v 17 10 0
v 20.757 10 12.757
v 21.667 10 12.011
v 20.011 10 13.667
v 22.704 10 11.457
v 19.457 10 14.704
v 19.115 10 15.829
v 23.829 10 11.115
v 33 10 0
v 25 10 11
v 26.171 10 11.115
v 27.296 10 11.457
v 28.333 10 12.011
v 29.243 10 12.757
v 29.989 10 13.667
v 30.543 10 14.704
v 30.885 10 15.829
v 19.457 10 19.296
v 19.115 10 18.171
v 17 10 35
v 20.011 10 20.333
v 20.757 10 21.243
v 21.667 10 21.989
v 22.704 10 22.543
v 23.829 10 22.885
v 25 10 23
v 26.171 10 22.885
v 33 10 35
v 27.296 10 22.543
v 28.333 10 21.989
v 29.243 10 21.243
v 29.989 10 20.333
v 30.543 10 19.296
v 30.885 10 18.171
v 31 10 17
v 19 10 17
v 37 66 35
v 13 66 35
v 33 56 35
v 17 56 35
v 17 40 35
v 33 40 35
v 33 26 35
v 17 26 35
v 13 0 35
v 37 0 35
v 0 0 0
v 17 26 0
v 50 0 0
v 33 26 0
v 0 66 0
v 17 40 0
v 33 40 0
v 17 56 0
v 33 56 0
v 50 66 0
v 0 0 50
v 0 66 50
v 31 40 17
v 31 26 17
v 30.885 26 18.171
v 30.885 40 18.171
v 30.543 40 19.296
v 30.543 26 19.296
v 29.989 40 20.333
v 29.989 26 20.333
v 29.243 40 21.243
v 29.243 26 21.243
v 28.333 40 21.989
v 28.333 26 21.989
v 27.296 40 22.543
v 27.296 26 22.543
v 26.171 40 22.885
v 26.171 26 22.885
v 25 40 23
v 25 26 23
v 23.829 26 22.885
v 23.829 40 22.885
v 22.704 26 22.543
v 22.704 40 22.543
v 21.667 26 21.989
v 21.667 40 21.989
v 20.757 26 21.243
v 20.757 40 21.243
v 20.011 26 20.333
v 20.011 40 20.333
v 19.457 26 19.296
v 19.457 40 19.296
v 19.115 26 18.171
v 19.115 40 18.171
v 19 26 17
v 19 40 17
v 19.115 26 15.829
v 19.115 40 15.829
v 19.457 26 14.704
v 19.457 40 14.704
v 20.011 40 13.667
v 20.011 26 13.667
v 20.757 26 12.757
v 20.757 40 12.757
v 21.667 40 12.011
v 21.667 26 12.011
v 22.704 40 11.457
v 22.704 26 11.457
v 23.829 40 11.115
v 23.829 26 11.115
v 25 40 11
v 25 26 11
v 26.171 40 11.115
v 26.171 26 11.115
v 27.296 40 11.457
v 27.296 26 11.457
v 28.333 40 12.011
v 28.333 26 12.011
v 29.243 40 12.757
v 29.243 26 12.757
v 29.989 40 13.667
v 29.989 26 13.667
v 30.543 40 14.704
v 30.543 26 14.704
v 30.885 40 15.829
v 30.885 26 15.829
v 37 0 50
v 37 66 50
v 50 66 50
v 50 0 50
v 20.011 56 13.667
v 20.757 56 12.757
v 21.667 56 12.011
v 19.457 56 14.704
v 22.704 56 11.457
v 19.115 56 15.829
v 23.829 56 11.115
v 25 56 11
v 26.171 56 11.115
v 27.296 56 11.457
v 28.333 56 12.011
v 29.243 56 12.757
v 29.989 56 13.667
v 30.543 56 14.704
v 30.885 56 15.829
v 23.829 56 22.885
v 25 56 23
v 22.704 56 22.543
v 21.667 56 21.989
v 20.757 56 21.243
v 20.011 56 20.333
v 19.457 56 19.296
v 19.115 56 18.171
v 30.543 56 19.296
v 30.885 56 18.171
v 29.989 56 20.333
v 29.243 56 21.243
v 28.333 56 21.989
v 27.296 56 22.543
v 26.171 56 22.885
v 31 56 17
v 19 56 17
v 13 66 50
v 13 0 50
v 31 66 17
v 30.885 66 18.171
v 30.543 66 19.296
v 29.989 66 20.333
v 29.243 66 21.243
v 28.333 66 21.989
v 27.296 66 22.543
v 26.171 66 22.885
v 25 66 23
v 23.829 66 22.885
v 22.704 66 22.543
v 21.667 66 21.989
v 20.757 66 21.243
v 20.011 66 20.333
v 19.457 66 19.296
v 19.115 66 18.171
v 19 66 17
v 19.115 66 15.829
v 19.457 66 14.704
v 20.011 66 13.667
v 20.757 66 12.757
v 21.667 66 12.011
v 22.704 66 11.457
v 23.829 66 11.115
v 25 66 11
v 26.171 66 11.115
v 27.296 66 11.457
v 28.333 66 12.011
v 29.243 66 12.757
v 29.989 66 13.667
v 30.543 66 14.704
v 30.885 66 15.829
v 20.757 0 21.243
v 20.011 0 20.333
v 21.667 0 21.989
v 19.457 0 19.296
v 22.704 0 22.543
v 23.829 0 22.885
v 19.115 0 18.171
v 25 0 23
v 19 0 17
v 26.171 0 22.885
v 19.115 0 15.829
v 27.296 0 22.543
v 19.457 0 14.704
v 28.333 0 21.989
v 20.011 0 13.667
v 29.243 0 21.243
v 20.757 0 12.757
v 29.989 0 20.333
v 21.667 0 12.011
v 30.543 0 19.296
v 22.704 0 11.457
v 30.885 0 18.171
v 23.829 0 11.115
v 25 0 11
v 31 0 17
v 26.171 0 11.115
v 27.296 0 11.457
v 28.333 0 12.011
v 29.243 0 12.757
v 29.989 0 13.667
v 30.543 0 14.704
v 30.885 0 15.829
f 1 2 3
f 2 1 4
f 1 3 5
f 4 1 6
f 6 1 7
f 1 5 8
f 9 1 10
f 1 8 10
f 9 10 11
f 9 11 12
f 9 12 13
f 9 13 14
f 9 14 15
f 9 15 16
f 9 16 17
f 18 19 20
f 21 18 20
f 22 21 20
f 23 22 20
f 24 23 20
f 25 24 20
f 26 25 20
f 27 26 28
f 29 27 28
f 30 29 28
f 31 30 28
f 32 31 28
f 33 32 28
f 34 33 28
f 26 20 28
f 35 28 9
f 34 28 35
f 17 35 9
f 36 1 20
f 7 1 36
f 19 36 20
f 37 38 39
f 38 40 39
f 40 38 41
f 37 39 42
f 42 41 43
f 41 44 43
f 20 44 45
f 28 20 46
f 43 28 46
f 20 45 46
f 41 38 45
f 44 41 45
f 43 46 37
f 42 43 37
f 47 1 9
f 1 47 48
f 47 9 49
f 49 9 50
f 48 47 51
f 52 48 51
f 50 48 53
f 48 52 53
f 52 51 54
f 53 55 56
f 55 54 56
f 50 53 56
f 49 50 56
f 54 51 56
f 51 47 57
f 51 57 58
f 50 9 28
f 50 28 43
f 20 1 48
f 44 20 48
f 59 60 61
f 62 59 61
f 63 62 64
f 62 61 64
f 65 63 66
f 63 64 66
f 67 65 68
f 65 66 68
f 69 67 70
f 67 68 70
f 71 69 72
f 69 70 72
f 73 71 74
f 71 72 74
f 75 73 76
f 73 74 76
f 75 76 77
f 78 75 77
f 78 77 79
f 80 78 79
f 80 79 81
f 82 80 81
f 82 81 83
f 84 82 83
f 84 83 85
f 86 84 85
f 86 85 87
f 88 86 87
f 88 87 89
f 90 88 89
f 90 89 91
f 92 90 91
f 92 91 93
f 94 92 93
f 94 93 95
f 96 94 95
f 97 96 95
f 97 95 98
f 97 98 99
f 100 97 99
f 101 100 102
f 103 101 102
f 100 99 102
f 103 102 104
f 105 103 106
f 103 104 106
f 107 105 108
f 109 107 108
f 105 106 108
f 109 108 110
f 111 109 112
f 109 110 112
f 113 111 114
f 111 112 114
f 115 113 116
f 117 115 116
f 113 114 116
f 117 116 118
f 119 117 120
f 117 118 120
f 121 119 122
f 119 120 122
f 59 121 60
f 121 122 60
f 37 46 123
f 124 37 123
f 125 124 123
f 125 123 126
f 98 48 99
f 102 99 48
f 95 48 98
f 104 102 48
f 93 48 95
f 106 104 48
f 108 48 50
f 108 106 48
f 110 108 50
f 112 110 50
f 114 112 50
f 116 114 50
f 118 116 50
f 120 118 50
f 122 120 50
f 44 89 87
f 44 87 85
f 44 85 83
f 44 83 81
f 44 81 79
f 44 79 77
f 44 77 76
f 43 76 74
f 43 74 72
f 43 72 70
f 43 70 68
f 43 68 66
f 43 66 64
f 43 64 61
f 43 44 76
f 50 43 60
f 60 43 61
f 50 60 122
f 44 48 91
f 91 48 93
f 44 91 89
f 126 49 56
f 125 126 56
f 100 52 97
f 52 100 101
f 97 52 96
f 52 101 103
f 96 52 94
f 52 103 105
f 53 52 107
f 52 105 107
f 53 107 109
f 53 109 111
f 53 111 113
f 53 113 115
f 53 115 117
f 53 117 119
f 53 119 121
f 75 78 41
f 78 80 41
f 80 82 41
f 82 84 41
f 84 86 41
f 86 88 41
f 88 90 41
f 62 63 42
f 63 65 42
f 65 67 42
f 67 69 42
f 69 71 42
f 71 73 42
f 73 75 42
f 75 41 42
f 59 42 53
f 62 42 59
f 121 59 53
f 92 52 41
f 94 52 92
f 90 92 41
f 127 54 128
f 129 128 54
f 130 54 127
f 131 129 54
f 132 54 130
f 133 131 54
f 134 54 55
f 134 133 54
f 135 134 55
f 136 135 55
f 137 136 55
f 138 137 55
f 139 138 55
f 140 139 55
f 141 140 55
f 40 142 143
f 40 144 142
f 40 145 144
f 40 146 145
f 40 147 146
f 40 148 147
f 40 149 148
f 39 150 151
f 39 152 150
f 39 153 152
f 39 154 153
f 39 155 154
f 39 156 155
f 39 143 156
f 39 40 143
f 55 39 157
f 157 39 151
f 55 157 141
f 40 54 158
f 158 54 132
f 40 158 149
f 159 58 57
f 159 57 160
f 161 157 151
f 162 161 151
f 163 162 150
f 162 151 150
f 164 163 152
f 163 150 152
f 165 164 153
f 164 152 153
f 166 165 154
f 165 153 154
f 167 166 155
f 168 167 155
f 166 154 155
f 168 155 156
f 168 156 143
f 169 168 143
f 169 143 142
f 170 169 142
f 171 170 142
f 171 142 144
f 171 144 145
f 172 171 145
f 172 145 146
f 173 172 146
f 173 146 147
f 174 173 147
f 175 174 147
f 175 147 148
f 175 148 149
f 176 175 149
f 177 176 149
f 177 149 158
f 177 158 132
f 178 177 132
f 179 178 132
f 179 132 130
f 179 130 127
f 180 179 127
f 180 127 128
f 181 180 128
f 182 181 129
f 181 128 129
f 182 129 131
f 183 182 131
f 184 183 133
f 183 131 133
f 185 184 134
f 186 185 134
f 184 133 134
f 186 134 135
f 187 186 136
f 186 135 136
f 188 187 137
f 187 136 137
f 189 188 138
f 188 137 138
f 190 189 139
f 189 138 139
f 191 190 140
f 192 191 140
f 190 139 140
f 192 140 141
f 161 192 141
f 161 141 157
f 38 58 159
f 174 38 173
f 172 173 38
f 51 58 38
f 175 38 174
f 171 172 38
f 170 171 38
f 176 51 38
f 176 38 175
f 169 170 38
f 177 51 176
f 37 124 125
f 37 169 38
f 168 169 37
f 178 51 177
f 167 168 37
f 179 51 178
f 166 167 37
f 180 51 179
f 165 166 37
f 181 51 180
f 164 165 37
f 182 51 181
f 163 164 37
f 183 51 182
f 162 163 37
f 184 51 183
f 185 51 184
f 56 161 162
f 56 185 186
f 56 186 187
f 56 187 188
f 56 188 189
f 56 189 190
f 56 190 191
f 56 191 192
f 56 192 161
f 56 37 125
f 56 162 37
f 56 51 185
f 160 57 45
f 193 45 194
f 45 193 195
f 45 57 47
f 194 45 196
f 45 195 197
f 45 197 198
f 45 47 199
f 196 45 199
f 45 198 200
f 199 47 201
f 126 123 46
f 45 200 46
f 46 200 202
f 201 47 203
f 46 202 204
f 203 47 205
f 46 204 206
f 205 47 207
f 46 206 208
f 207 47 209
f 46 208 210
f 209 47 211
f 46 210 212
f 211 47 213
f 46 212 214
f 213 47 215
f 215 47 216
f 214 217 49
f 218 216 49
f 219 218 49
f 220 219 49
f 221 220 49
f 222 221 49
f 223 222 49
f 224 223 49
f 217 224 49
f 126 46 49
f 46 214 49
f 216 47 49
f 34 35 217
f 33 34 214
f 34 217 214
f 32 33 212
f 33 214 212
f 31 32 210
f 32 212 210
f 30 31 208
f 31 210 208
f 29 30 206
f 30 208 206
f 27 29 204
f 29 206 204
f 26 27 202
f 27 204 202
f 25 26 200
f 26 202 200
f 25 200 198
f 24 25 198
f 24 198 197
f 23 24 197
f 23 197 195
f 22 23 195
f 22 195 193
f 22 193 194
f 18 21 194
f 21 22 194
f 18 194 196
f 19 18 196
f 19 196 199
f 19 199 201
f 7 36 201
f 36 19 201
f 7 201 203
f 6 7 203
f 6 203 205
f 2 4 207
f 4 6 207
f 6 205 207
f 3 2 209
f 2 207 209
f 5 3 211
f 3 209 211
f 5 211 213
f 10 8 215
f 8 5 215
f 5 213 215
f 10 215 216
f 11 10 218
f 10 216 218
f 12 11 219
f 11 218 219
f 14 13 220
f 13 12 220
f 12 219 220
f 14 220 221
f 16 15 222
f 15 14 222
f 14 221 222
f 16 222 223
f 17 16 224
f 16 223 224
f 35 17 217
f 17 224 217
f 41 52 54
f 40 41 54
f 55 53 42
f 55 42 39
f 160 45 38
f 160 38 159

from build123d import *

# Parameters (mm, degrees)
F0_W     = 50
F0_H     = 66
F1_DEPTH = 50
F2_W     = 24
F2_H     = 15
F3_DEPTH = 66
F4_R     = 6
F5_DEPTH = 66
F6_W     = 12
F6_H     = 16
F7_DEPTH = 35
F8_W     = 2
F8_H     = 16
F9_DEPTH = 35


with BuildPart() as f1:
    # F0 (on Top) → F1 (new body)
    with BuildSketch(Plane.XY):
        with Locations((25, 33)):
            Rectangle(F0_W, F0_H)
    extrude(amount=F1_DEPTH)

    # F2 (on face) → F3 (cut)
    with BuildSketch(Plane.XZ):
        with Locations((25, 42.5)):
            Rectangle(F2_W, F2_H)
    extrude(amount=-F3_DEPTH, mode=Mode.SUBTRACT)

    # F4 (on face) → F5 (cut)
    with BuildSketch(Plane.XZ):
        with Locations((25, 17)):
            Circle(F4_R)
    extrude(amount=-F5_DEPTH, mode=Mode.SUBTRACT)

    # F6 (on face) → F7 (cut)
    with BuildSketch(Plane.XY.offset(35)):
        with Locations((25, 48)):
            Rectangle(F6_W, F6_H)
        with Locations((25, 18)):
            Rectangle(F6_W, F6_H)
    extrude(amount=-F7_DEPTH, mode=Mode.SUBTRACT)

    # F8 (on face) → F9 (cut)
    with BuildSketch(Plane.XY.offset(35)):
        with Locations((18, 48)):
            Rectangle(F8_W, F8_H)
        with Locations((32, 48)):
            Rectangle(F8_W, F8_H)
        with Locations((18, 18)):
            Rectangle(F8_W, F8_H)
        with Locations((32, 18)):
            Rectangle(F8_W, F8_H)
    extrude(amount=-F9_DEPTH, mode=Mode.SUBTRACT)


solid = f1.part
